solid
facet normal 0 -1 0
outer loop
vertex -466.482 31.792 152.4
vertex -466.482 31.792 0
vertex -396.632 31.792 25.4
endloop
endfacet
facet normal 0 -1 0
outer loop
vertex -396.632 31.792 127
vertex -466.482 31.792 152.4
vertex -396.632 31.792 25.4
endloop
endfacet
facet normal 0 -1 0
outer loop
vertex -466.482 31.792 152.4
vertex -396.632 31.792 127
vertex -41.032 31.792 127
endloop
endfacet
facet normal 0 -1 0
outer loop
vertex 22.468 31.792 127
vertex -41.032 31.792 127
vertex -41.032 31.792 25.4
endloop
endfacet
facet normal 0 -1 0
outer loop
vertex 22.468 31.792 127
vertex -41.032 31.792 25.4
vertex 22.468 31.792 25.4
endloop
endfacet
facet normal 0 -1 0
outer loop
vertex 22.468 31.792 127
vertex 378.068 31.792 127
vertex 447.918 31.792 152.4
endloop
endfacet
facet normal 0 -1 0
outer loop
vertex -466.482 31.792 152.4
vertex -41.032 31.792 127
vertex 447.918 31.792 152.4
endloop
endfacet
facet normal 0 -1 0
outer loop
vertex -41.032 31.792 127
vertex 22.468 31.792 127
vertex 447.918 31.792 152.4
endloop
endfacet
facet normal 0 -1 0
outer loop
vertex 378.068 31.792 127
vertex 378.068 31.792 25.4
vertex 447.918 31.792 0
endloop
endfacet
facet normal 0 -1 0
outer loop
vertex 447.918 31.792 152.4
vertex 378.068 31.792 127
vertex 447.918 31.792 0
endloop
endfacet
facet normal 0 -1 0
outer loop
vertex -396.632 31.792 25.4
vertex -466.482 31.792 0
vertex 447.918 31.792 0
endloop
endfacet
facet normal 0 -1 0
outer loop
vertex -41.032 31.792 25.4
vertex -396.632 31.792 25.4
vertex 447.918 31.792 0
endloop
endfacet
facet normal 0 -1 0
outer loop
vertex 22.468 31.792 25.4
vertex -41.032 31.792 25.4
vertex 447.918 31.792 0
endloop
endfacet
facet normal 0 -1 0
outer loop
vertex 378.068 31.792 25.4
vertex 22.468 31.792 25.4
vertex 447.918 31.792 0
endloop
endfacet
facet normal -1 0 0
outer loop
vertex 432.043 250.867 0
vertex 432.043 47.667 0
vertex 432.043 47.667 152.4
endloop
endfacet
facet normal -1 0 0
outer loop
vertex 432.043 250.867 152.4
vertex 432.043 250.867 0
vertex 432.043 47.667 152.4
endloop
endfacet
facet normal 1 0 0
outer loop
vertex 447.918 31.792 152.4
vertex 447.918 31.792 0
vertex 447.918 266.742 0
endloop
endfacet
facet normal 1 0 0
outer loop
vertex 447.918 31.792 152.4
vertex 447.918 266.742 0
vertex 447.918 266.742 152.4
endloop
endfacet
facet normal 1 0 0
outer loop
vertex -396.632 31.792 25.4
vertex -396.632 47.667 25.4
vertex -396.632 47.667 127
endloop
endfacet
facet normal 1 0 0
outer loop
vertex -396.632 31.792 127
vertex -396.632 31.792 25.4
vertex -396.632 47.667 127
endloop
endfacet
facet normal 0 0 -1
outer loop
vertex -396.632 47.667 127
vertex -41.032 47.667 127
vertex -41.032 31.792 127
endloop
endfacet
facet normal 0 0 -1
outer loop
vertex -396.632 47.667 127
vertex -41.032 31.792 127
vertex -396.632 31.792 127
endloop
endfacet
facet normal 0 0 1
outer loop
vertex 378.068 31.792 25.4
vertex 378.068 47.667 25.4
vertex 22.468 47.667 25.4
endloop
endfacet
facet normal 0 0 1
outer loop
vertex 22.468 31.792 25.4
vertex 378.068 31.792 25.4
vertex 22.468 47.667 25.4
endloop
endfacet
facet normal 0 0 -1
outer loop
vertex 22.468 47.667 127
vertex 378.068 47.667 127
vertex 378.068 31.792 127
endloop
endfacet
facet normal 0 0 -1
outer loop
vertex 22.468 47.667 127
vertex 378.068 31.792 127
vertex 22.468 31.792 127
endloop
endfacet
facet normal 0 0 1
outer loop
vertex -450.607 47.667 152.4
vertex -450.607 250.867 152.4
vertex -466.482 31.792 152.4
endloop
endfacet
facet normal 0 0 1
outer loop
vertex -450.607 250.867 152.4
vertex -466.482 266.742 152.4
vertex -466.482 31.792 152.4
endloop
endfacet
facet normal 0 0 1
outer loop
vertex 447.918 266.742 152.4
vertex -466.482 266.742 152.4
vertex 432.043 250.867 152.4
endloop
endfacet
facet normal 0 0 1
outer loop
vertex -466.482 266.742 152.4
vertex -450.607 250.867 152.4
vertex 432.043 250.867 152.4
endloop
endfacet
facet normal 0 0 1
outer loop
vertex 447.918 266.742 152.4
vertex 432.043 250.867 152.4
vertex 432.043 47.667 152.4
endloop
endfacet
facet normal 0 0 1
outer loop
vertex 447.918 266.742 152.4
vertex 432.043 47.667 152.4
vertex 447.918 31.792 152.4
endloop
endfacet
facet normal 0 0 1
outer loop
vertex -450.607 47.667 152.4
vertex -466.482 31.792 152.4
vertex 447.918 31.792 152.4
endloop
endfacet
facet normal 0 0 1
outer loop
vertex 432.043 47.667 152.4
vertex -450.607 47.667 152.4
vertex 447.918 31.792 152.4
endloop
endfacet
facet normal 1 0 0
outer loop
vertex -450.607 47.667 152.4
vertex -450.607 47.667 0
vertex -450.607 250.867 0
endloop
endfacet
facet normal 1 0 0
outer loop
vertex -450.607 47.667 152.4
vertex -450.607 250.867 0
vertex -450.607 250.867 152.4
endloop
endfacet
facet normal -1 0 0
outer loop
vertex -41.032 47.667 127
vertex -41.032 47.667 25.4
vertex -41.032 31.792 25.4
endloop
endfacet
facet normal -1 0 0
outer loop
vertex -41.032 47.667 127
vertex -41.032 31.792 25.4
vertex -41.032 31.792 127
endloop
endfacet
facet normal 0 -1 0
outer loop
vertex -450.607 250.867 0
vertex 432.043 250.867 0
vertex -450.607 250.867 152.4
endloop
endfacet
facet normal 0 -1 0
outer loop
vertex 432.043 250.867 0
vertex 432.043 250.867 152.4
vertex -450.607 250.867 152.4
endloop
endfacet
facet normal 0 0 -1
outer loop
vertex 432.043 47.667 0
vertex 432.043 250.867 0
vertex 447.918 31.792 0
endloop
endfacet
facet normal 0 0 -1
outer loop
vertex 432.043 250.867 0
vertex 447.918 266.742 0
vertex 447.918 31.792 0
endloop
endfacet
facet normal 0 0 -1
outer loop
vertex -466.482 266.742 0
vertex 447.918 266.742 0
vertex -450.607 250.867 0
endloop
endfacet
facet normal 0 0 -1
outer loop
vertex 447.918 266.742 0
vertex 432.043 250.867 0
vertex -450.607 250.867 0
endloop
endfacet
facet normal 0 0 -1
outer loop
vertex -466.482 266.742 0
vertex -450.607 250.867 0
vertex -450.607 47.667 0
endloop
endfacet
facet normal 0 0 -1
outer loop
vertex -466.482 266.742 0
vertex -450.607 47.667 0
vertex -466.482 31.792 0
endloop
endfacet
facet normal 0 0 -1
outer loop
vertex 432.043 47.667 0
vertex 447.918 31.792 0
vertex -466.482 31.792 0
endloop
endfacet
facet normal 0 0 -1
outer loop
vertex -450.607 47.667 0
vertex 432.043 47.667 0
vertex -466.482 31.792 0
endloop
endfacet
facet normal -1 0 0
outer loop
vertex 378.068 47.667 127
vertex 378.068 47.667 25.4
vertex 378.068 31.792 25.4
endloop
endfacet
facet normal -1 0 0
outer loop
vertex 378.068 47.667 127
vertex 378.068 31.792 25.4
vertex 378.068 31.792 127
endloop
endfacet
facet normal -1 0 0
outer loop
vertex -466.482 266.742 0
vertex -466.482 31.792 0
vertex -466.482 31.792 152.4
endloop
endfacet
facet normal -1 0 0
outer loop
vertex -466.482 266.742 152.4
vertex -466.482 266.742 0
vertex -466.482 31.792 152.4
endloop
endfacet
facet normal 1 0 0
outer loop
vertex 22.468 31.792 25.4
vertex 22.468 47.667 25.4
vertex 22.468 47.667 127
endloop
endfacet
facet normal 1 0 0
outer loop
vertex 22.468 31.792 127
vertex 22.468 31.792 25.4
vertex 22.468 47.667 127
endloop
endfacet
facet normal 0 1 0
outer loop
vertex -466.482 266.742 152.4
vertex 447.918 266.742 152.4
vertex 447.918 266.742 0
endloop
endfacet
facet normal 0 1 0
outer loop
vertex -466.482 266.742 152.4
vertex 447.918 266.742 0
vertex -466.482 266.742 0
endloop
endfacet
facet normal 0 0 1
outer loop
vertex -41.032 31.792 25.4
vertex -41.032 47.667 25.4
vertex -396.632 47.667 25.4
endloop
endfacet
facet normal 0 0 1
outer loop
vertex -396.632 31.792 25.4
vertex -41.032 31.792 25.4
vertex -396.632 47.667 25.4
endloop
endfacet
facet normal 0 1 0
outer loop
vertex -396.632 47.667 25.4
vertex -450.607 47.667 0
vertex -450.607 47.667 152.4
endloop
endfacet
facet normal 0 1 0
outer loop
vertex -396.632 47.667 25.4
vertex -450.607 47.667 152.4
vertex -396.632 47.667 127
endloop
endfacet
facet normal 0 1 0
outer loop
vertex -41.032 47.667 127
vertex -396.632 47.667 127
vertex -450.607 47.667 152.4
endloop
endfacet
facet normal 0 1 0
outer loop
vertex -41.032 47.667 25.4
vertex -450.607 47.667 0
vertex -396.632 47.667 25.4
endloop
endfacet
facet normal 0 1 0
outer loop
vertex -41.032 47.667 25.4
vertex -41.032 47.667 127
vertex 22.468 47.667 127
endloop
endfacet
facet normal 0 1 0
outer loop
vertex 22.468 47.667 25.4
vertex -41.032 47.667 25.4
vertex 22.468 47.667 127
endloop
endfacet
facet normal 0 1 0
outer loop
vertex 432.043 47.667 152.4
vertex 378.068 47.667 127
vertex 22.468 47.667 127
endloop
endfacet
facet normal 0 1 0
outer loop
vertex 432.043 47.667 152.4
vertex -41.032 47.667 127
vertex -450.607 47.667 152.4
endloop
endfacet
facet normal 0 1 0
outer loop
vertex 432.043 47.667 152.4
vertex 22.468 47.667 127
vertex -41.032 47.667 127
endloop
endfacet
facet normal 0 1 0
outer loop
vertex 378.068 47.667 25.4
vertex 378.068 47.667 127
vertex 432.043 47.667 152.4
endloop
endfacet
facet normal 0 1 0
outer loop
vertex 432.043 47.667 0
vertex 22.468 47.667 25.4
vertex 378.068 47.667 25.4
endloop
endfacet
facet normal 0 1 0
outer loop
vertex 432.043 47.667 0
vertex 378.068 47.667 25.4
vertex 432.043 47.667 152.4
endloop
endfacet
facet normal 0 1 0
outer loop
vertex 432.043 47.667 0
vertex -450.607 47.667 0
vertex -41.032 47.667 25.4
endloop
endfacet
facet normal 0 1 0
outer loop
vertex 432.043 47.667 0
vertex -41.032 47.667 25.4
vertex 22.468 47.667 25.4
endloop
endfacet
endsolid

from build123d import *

# Parameters (mm, degrees)
F0_W     = 914.4
F0_H     = 15.875
F1_DEPTH = 152.4
F2_W     = 355.6
F2_H     = 101.6
F3_DEPTH = 25.4
F4_W     = 15.875
F4_H     = 152.4
F5_DEPTH = 203.2
F6_W     = 898.525
F6_H     = 152.4
F6_W_2   = 15.875
F7_DEPTH = 15.875


with BuildPart() as f1:
    # F0 (on Top) → F1 (new body)
    with BuildSketch(Plane.XY):
        with Locations((-9.282473, 39.729246)):
            Rectangle(F0_W, F0_H)
    extrude(amount=F1_DEPTH)

    # F2 (on face) → F3 (cut)
    with BuildSketch(Plane(origin=(0, 47.666746, 0), x_dir=(-1, 0, 0), z_dir=(0, 1, 0))):
        with Locations((-200.267527, 76.2)):
            Rectangle(F2_W, F2_H)
        with Locations((218.832473, 76.2)):
            Rectangle(F2_W, F2_H)
    extrude(amount=-F3_DEPTH, mode=Mode.SUBTRACT)

    # F4 (on face) → F5 (join)
    with BuildSketch(Plane(origin=(0, 47.666746, 0), x_dir=(-1, 0, 0), z_dir=(0, 1, 0))):
        with Locations((-439.980027, 76.2)):
            Rectangle(F4_W, F4_H)
        with Locations((458.544973, 76.2)):
            Rectangle(F4_W, F4_H)
    extrude(amount=F5_DEPTH)

    # F6 (on face) → F7 (join)
    with BuildSketch(Plane(origin=(0, 250.866746, 0), x_dir=(-1, 0, 0), z_dir=(0, 1, 0))):
        with Locations((17.219973, 76.2)):
            Rectangle(F6_W, F6_H)
        with Locations((-439.980027, 76.2)):
            Rectangle(F6_W_2, F6_H)
    extrude(amount=F7_DEPTH)


solid = f1.part
